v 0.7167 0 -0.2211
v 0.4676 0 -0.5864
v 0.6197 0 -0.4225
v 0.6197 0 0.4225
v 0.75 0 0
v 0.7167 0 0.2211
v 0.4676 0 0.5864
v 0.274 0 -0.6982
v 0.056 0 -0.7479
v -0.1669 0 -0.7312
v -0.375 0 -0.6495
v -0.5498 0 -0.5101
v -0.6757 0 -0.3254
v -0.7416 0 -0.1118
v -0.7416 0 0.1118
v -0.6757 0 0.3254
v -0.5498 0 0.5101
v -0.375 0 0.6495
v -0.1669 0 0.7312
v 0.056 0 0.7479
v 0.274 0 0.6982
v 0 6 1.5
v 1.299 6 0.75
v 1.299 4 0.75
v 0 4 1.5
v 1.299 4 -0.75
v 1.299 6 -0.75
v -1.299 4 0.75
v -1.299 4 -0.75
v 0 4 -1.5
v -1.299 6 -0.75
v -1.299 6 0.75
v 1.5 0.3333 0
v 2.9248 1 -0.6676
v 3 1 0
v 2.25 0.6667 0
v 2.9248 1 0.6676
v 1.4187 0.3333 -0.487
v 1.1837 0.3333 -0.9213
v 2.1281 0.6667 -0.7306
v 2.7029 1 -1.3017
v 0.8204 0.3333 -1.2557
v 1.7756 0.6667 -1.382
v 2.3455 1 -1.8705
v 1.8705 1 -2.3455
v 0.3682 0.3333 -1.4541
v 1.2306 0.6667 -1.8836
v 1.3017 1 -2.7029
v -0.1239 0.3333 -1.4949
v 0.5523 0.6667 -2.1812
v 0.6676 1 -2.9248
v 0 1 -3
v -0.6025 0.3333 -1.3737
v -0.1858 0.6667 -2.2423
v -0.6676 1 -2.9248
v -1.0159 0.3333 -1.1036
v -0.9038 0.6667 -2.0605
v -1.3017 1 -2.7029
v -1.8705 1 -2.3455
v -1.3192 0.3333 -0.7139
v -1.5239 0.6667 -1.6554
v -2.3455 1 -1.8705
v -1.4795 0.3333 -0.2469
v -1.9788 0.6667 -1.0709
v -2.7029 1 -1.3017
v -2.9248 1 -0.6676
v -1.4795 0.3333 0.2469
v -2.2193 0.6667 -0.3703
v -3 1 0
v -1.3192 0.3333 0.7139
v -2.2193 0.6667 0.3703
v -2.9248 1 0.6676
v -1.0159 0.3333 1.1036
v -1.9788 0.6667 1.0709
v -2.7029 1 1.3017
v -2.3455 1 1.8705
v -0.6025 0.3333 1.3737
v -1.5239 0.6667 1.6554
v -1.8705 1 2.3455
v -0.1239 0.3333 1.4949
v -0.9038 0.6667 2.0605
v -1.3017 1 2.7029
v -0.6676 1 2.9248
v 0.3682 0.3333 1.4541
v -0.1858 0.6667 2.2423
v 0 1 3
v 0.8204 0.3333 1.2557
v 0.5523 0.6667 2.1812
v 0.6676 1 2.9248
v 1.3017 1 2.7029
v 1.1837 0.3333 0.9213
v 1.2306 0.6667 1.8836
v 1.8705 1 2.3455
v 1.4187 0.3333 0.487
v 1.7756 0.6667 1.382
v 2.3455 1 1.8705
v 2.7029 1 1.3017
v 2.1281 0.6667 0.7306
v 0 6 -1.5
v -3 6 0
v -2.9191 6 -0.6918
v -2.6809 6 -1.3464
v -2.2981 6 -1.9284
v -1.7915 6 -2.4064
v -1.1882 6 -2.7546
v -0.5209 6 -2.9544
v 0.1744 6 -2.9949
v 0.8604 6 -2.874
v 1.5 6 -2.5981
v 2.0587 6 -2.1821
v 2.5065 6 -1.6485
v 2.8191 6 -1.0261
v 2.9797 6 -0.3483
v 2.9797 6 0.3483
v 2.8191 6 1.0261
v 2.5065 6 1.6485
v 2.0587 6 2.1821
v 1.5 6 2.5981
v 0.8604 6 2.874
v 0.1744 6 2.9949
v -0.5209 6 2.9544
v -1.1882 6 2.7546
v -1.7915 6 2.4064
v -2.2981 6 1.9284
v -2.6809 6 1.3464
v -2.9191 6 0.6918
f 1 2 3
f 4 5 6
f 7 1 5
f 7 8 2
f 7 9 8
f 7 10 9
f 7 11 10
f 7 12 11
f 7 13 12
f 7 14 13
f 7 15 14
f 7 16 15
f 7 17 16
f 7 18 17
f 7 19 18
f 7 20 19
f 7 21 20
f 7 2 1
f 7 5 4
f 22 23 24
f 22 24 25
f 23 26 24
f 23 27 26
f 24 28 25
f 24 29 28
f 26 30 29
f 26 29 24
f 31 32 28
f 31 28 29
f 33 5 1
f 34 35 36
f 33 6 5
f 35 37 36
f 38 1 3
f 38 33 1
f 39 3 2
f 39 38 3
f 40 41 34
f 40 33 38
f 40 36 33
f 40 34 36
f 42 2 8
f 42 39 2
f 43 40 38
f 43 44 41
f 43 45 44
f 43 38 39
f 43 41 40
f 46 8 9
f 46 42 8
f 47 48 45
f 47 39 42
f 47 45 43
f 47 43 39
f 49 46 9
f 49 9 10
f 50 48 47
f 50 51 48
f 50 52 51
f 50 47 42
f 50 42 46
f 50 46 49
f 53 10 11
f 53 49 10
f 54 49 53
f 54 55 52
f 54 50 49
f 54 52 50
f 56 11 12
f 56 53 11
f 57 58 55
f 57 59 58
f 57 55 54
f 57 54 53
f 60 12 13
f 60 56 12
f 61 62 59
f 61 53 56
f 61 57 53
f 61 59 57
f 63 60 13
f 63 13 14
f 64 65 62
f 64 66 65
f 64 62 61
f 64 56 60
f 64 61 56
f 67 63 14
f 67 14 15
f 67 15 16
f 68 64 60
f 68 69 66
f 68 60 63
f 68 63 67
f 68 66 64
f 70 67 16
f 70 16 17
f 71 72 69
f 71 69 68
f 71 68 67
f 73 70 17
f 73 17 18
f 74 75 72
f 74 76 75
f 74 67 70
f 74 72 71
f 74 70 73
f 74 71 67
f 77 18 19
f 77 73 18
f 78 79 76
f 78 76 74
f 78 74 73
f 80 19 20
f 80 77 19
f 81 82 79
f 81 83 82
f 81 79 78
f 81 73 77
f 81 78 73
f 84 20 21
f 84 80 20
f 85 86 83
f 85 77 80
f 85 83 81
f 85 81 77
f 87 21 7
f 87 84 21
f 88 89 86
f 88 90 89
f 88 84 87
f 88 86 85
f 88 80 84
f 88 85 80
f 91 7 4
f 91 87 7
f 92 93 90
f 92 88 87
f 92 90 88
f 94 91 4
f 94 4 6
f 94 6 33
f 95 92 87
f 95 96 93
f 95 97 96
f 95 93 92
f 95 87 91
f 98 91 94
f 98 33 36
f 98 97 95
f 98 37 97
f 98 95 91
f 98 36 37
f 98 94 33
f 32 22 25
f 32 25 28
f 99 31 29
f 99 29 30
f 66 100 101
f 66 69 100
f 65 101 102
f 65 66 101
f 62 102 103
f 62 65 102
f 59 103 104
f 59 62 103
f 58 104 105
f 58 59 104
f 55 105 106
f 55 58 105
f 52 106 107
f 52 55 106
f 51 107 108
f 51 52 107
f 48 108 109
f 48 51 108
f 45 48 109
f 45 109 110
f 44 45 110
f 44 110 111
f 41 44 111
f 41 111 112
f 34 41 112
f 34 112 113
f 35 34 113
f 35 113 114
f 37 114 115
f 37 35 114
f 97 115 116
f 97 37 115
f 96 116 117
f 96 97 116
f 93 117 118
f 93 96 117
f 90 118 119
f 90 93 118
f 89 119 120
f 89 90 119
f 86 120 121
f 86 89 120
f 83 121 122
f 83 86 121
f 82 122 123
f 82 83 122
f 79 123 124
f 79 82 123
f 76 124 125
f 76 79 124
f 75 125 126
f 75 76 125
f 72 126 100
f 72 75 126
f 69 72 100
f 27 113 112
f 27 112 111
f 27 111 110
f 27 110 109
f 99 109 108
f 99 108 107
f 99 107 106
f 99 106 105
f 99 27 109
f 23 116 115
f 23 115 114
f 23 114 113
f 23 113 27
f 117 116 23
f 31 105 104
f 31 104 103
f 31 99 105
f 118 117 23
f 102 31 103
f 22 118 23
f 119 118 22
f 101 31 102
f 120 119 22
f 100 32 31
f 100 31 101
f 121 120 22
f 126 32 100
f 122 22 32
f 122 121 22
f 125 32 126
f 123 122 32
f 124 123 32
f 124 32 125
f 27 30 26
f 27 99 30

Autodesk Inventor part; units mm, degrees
ref_plane "YZ Plane" through (0, 0, 0) normal (1, 0, 0) x (0, 1, 0)
ref_plane "XZ Plane" through (0, 0, 0) normal (0, 1, 0) x (-1, 0, 0)
ref_plane "XY Plane" through (0, 0, 0) normal (0, 0, 1) x (1, 0, 0)
sketch "Sketch1" plane through (0, 0, 0) normal (0, 1, 0) x (-1, 0, 0)
  circle A0 centre (0, 0) radius 3
  dimension "d0" = 6
extrude "Extrusion1" add sketch "Sketch1" along normal blind 6
sketch "Sketch2" plane through (0, 0, 0) normal (0, -1, 0) x (1, 0, 0)
  circle A0 centre (0, 0) radius 0.75
  circle A1 centre (0, 0) radius 3
  dimension "d3" = 1.5
extrude "Extrusion2" cut sketch "Sketch2" against normal blind 1
loft "Loft1" add section 1 edges at (-0.75, 0, 0) section 2 edges at (3, 1, 0)
thread "Thread1" size "M6x0.75" class "6g" standard "ANSI Metric M Profile" full length
sketch "Sketch3" plane through (0, 6, 0) normal (0, 1, 0) x (1, 0, 0)
  line L0 (0, 0) -> (0, 1.5)
  line L1 (0, 1.5) -> (1.299, 0.75)
  line L2 (1.299, 0.75) -> (1.299, -0.75)
  line L3 (1.299, -0.75) -> (0, -1.5)
  line L4 (0, -1.5) -> (-1.299, -0.75)
  line L5 (-1.299, -0.75) -> (-1.299, 0.75)
  line L6 (-1.299, 0.75) -> (0, 1.5)
  dimension "d12" = 1.5
extrude "Extrusion3" cut sketch "Sketch3" against normal blind 2
properties part number "M6x6_DIN914" material "Steel, Mild"
